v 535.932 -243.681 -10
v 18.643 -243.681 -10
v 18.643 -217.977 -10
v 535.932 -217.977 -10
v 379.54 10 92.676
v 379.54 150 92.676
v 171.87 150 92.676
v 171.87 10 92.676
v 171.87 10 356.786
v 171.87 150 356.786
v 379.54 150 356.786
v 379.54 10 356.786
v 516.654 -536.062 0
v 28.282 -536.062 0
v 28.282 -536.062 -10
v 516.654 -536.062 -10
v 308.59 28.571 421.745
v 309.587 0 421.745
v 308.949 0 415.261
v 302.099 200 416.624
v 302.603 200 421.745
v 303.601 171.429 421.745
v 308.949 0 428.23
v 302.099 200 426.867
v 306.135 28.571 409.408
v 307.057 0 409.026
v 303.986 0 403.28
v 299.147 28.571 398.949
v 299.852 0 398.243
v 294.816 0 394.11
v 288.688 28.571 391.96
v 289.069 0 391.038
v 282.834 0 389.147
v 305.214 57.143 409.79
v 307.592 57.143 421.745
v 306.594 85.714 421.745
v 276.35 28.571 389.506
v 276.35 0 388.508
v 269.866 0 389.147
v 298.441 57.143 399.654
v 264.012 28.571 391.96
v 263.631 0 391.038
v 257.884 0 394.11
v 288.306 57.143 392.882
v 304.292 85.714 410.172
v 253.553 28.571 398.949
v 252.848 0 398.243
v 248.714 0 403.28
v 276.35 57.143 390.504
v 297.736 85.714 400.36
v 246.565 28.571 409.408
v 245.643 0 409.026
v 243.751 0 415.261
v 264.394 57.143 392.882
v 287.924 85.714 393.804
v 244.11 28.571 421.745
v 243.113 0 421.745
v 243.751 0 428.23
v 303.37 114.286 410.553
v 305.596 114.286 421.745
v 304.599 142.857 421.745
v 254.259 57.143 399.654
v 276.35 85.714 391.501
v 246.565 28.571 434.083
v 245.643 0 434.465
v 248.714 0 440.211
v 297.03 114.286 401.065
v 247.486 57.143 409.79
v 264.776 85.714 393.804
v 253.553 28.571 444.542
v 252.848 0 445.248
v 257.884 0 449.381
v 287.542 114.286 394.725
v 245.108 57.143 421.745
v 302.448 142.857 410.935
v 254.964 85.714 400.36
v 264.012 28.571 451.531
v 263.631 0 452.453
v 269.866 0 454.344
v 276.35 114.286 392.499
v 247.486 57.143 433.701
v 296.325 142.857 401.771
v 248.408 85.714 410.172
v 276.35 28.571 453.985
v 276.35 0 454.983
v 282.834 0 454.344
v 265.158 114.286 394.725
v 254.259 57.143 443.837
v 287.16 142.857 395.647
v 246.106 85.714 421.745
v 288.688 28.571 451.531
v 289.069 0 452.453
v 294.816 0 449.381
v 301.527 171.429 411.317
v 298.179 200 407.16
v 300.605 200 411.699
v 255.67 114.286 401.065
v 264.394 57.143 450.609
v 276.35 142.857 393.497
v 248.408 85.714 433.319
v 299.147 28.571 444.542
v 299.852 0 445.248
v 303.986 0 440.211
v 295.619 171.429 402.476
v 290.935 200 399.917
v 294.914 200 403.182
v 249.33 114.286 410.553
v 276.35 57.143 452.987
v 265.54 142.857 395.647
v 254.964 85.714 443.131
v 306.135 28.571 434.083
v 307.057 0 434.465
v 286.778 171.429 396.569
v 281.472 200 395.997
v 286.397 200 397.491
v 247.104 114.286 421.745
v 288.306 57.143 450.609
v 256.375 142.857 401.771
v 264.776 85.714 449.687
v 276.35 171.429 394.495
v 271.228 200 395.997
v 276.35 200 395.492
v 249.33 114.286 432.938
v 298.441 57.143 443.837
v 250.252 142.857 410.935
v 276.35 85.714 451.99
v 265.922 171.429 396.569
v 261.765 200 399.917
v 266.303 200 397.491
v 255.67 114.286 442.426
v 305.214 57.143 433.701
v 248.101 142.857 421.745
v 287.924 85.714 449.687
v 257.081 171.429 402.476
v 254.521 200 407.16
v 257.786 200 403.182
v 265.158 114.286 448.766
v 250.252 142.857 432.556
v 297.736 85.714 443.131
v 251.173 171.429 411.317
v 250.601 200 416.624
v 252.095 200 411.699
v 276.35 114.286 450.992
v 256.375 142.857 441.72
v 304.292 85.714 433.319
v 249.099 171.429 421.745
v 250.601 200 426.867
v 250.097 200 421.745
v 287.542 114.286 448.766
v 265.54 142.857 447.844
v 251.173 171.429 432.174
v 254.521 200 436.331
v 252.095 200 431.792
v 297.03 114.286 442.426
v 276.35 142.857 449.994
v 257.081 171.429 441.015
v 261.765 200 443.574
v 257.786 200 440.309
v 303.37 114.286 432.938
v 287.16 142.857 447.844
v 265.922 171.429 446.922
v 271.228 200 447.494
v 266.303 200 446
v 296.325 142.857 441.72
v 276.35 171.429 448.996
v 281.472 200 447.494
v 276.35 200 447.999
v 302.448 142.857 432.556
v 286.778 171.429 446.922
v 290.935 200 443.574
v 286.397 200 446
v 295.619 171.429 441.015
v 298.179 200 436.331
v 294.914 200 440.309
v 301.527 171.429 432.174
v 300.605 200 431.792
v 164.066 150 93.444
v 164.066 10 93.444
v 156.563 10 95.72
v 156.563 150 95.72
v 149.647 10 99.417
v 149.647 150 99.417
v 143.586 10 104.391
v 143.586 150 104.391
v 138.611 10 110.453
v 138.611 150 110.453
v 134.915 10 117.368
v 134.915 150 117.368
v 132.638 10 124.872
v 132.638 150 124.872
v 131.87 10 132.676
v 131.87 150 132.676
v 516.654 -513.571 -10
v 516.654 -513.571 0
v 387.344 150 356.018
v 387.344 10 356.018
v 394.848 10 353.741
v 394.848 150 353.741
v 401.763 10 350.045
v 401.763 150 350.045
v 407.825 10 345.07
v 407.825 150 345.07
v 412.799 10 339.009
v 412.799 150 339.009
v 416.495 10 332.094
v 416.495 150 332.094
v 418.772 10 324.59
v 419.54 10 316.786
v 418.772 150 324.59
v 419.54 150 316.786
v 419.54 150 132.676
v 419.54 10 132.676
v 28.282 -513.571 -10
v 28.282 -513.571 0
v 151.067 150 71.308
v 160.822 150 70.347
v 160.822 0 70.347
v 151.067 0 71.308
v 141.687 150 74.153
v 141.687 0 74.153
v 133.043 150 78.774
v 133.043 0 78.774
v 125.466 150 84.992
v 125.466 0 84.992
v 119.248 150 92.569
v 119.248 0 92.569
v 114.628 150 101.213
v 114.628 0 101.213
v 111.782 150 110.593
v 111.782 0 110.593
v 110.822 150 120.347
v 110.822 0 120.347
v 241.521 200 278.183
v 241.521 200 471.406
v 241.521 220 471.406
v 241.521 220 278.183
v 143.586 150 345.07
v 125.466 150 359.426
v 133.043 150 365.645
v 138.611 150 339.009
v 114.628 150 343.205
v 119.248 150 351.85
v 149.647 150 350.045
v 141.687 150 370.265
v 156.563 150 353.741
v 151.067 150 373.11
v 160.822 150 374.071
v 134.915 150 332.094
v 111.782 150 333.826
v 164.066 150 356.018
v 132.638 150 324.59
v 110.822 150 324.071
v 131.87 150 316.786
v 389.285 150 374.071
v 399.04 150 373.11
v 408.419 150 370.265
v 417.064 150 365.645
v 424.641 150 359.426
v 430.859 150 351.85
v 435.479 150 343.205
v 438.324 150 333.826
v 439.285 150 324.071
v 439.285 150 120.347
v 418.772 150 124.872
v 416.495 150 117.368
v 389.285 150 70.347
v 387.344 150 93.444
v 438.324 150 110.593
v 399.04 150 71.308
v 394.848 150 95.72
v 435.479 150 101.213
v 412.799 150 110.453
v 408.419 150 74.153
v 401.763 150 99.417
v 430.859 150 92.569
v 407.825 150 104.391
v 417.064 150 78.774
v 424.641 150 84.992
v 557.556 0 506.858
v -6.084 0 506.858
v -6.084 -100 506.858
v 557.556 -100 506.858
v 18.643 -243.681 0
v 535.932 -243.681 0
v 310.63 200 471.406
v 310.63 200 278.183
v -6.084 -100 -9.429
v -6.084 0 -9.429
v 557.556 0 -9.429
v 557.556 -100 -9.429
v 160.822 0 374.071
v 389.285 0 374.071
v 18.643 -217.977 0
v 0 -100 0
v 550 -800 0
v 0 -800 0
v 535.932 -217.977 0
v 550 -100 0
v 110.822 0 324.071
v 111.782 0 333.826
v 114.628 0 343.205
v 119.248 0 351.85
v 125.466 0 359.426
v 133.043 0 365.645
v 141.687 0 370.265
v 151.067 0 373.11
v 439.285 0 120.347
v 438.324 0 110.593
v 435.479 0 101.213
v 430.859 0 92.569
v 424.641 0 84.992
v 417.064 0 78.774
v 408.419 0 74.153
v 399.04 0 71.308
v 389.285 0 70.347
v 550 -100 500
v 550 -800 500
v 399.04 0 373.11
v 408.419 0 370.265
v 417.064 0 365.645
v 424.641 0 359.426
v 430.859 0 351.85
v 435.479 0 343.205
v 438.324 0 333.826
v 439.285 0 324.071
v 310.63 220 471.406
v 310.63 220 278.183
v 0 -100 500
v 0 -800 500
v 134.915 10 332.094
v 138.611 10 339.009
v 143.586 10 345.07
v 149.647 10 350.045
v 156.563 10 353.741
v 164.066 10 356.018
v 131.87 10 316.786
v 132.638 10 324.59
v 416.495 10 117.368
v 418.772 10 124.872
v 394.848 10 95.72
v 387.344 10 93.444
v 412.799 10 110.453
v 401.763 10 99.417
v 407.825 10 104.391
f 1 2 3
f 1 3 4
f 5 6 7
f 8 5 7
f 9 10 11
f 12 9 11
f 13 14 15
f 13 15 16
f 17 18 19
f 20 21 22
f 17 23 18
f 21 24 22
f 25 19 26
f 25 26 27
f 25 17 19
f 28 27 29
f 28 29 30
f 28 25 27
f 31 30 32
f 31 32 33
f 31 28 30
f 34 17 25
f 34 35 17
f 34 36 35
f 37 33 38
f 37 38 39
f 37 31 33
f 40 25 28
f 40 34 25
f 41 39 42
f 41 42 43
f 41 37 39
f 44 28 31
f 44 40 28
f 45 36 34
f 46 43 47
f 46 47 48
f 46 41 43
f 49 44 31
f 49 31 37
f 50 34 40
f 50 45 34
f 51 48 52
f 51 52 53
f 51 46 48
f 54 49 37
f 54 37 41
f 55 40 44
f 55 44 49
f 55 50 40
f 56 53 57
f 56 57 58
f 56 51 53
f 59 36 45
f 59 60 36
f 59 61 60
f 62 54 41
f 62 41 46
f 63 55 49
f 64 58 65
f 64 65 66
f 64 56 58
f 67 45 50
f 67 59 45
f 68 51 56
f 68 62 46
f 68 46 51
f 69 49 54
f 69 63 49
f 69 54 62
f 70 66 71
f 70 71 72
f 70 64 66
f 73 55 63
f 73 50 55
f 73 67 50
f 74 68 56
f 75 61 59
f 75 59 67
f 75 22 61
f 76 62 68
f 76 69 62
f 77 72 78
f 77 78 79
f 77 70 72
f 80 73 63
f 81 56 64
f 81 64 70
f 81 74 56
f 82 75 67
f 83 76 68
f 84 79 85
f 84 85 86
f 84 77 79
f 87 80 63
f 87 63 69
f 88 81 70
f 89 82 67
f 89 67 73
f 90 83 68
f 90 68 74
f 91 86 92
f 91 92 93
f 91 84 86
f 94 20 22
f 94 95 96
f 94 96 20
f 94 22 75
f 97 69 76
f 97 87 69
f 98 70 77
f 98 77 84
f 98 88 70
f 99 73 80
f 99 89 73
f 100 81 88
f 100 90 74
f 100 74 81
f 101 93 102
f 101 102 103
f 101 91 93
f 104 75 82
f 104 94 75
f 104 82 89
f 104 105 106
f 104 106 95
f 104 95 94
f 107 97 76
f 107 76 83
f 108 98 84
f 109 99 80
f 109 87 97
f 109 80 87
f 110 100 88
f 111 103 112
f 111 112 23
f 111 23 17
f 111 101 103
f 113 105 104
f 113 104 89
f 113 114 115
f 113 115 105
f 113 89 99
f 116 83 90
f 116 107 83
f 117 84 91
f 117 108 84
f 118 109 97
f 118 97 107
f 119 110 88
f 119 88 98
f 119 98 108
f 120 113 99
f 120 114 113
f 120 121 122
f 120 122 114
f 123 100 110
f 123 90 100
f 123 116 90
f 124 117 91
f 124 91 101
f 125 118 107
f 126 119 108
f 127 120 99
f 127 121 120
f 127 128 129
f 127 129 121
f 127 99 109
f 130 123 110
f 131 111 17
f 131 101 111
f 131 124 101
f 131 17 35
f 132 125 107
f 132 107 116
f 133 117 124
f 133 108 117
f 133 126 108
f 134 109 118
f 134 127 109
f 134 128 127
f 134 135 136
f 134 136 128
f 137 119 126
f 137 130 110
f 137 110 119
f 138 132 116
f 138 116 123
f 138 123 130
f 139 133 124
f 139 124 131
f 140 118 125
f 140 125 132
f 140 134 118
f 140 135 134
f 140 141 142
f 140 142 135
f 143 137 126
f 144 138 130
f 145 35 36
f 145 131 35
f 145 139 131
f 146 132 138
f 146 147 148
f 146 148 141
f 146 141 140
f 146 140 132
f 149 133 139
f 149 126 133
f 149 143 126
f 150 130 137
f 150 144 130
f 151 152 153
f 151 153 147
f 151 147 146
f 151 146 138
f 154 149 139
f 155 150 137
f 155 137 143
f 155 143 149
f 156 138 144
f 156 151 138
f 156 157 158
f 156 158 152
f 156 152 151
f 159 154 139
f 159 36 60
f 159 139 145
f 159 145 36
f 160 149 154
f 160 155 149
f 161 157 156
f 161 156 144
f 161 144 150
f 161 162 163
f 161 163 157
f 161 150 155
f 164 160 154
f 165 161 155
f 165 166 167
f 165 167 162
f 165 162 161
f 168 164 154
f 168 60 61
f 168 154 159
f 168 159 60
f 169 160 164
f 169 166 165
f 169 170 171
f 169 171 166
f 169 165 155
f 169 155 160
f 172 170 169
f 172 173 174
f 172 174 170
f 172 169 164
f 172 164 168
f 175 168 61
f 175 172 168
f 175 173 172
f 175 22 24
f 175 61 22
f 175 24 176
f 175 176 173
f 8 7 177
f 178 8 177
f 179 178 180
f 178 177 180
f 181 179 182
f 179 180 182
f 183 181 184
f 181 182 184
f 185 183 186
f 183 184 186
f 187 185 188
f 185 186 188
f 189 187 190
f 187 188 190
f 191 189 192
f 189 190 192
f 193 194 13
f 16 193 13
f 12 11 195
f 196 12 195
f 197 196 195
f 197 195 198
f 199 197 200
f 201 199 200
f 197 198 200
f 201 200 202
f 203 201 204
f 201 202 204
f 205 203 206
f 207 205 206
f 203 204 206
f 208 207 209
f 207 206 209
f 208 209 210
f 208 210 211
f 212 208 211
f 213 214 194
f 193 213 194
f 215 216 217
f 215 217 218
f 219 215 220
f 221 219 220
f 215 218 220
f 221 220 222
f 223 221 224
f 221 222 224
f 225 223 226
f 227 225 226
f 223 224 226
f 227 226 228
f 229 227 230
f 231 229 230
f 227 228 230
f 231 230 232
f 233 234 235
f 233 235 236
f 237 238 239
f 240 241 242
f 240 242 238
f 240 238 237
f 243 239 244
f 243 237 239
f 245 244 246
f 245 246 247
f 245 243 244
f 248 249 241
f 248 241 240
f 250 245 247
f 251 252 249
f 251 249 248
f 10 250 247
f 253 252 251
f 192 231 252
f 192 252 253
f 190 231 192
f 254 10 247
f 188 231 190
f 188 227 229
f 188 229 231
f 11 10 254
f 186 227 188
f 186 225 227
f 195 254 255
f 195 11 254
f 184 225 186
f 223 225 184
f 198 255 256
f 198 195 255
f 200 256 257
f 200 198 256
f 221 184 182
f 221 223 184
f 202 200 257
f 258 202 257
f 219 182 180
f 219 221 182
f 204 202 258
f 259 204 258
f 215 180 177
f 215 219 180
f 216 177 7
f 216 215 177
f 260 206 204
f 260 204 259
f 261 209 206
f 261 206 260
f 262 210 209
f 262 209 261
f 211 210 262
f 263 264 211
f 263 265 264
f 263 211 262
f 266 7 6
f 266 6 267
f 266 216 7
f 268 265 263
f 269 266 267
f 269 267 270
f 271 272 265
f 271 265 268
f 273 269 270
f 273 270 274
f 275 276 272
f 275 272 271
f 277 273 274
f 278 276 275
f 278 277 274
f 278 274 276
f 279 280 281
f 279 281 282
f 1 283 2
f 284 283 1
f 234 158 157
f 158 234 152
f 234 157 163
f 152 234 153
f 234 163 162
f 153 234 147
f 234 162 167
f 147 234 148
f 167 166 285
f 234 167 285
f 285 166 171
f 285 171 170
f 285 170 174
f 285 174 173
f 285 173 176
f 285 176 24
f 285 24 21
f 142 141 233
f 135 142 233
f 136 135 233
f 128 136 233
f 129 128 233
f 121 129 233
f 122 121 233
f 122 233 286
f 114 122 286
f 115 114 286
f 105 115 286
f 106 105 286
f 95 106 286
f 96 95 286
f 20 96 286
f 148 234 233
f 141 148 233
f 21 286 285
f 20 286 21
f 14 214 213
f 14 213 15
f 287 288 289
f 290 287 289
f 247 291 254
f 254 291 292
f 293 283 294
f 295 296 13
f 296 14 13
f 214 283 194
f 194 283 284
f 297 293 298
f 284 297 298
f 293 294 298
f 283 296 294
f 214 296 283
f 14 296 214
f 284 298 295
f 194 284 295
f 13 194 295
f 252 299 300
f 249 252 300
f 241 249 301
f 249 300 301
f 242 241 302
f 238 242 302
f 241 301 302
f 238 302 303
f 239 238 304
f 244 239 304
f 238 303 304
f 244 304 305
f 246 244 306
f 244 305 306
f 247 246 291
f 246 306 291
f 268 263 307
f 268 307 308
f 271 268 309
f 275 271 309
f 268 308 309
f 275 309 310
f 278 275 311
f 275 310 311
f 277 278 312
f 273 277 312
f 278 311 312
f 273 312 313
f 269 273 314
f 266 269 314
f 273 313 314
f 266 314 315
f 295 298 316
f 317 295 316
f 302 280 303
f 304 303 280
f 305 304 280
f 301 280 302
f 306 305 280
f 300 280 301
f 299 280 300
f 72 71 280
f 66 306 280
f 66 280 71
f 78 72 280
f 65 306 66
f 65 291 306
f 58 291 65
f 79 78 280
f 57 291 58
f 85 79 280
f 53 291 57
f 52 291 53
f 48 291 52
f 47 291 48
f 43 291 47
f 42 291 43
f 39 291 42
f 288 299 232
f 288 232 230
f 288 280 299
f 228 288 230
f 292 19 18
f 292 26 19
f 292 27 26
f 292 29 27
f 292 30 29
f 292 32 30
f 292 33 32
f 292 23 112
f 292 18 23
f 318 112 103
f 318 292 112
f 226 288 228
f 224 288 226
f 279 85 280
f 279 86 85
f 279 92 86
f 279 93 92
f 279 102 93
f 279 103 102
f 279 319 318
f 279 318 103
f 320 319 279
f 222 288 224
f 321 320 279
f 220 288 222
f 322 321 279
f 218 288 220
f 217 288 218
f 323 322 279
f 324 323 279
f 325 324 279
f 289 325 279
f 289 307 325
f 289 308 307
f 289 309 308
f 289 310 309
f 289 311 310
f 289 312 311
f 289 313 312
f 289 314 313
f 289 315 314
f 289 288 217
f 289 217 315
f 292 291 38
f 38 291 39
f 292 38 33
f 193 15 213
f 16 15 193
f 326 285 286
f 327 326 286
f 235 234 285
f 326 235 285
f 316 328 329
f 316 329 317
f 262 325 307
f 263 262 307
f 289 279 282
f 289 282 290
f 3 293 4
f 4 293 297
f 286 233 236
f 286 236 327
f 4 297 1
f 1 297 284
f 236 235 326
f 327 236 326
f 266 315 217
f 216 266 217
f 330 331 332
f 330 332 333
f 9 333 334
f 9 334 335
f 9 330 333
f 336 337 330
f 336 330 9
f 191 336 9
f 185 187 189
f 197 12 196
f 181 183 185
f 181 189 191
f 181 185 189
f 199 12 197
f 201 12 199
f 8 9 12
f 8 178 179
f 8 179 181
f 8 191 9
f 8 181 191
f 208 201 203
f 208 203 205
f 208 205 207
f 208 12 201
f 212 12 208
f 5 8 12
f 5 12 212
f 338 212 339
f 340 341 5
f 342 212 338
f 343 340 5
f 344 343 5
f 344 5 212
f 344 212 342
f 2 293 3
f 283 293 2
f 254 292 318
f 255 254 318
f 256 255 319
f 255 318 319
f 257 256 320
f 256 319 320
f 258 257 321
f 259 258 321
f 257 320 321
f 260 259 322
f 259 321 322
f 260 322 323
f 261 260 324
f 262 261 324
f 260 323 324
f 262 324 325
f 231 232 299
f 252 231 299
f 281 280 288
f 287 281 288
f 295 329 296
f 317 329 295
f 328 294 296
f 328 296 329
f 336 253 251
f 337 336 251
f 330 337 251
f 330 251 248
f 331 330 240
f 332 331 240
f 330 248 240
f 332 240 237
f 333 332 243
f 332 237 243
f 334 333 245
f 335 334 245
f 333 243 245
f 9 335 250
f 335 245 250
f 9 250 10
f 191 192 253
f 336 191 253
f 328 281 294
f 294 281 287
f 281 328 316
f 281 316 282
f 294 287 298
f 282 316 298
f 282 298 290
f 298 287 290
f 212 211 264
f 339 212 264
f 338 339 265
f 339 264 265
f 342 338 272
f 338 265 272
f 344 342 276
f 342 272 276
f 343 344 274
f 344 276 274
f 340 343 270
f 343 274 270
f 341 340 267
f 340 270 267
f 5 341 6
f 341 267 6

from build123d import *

# Parameters (mm, degrees)
SKETCH_W      = 550
SKETCH_H      = 500
PAD_DEPTH     = 800
PAD001_DEPTH  = 150
POCKET_DEPTH  = 140
SKETCH003_R   = 33.237299
PAD002_DEPTH  = 200
PAD002_TAPER  = 2
SKETCH004_W   = 69.108994
SKETCH004_H   = 193.223083
PAD003_DEPTH  = 20
SKETCH005_W   = 517.289068
SKETCH005_H   = 25.703766
SKETCH005_W_2 = 488.372336
SKETCH005_H_2 = 22.490784
PAD004_DEPTH  = 10
SKETCH006_W   = 563.640388
SKETCH006_H   = 516.287299
PAD005_DEPTH  = 100


with BuildPart() as part:
    # Sketch → Pad (new body)
    with BuildSketch(Plane.XZ):
        with Locations((275, 250)):
            Rectangle(SKETCH_W, SKETCH_H)
    extrude(amount=PAD_DEPTH)

    # Sketch001 (on Face5 of Pad) → Pad001 (join)
    with BuildSketch(Plane(origin=(0, 0, 0), x_dir=(1, 0, 0), z_dir=(0, 1, 0))):
        with BuildLine():
            Line((110.821515, -120.347227), (110.821515, -324.071047))
            ThreePointArc((110.821515, -324.071047), (125.466176, -359.426386), (160.821515, -374.071047))
            Line((160.821515, -374.071047), (389.285222, -374.071047))
            ThreePointArc((389.285222, -374.071047), (424.640561, -359.426386), (439.285222, -324.071047))
            Line((439.285222, -324.071047), (439.285222, -120.347227))
            ThreePointArc((439.285222, -120.347227), (424.640561, -84.991888), (389.285222, -70.347227))
            Line((389.285222, -70.347227), (160.821515, -70.347227))
            ThreePointArc((160.821515, -70.347227), (125.466176, -84.991888), (110.821515, -120.347227))
        make_face()
    extrude(amount=PAD001_DEPTH)

    # Sketch002 (on Face15 of Pad001) → Pocket (cut)
    with BuildSketch(Plane(origin=(0, 150, 0), x_dir=(1, 0, 0), z_dir=(0, 1, 0))):
        with BuildLine():
            Line((131.86986, -132.675529), (131.86986, -316.786224))
            ThreePointArc((131.86986, -316.786224), (143.585589, -345.070495), (171.86986, -356.786224))
            Line((171.86986, -356.786224), (379.540297, -356.786224))
            ThreePointArc((379.540297, -356.786224), (407.824568, -345.070495), (419.540297, -316.786224))
            Line((419.540297, -316.786224), (419.540297, -132.675529))
            ThreePointArc((419.540297, -132.675529), (407.824568, -104.391258), (379.540297, -92.675529))
            Line((379.540297, -92.675529), (171.86986, -92.675529))
            ThreePointArc((171.86986, -92.675529), (143.585589, -104.391258), (131.86986, -132.675529))
        make_face()
    extrude(amount=-POCKET_DEPTH, mode=Mode.SUBTRACT)

    # Sketch003 (on Face4 of Pocket) → Pad002 (join)
    with BuildSketch(Plane(origin=(0, 0, 0), x_dir=(1, 0, 0), z_dir=(0, 1, 0))):
        with Locations((276.350006, -421.745483)):
            Circle(SKETCH003_R)
    extrude(amount=PAD002_DEPTH, taper=PAD002_TAPER)

    # Sketch004 (on Face17 of Pad002) → Pad003 (join)
    with BuildSketch(Plane(origin=(0, 200, 0), x_dir=(1, 0, 0), z_dir=(0, 1, 0))):
        with Locations((276.075752, -374.794769)):
            Rectangle(SKETCH004_W, SKETCH004_H)
    extrude(amount=PAD003_DEPTH)

    # Sketch005 (on Face1 of Pad003) → Pad004 (join)
    with BuildSketch(Plane(origin=(0, 0, 0), x_dir=(1, 0, 0), z_dir=(0, 0, -1))):
        with Locations((277.28729, 230.829208)):
            Rectangle(SKETCH005_W, SKETCH005_H)
        with Locations((272.467824, 524.816498)):
            Rectangle(SKETCH005_W_2, SKETCH005_H_2)
    extrude(amount=PAD004_DEPTH)

    # Sketch006 (on Face3 of Pad004) → Pad005 (join)
    with BuildSketch(Plane(origin=(0, 0, 0), x_dir=(1, 0, 0), z_dir=(0, 1, 0))):
        with Locations((275.736264, -248.714535)):
            Rectangle(SKETCH006_W, SKETCH006_H)
    extrude(amount=-PAD005_DEPTH)


solid = part.part
